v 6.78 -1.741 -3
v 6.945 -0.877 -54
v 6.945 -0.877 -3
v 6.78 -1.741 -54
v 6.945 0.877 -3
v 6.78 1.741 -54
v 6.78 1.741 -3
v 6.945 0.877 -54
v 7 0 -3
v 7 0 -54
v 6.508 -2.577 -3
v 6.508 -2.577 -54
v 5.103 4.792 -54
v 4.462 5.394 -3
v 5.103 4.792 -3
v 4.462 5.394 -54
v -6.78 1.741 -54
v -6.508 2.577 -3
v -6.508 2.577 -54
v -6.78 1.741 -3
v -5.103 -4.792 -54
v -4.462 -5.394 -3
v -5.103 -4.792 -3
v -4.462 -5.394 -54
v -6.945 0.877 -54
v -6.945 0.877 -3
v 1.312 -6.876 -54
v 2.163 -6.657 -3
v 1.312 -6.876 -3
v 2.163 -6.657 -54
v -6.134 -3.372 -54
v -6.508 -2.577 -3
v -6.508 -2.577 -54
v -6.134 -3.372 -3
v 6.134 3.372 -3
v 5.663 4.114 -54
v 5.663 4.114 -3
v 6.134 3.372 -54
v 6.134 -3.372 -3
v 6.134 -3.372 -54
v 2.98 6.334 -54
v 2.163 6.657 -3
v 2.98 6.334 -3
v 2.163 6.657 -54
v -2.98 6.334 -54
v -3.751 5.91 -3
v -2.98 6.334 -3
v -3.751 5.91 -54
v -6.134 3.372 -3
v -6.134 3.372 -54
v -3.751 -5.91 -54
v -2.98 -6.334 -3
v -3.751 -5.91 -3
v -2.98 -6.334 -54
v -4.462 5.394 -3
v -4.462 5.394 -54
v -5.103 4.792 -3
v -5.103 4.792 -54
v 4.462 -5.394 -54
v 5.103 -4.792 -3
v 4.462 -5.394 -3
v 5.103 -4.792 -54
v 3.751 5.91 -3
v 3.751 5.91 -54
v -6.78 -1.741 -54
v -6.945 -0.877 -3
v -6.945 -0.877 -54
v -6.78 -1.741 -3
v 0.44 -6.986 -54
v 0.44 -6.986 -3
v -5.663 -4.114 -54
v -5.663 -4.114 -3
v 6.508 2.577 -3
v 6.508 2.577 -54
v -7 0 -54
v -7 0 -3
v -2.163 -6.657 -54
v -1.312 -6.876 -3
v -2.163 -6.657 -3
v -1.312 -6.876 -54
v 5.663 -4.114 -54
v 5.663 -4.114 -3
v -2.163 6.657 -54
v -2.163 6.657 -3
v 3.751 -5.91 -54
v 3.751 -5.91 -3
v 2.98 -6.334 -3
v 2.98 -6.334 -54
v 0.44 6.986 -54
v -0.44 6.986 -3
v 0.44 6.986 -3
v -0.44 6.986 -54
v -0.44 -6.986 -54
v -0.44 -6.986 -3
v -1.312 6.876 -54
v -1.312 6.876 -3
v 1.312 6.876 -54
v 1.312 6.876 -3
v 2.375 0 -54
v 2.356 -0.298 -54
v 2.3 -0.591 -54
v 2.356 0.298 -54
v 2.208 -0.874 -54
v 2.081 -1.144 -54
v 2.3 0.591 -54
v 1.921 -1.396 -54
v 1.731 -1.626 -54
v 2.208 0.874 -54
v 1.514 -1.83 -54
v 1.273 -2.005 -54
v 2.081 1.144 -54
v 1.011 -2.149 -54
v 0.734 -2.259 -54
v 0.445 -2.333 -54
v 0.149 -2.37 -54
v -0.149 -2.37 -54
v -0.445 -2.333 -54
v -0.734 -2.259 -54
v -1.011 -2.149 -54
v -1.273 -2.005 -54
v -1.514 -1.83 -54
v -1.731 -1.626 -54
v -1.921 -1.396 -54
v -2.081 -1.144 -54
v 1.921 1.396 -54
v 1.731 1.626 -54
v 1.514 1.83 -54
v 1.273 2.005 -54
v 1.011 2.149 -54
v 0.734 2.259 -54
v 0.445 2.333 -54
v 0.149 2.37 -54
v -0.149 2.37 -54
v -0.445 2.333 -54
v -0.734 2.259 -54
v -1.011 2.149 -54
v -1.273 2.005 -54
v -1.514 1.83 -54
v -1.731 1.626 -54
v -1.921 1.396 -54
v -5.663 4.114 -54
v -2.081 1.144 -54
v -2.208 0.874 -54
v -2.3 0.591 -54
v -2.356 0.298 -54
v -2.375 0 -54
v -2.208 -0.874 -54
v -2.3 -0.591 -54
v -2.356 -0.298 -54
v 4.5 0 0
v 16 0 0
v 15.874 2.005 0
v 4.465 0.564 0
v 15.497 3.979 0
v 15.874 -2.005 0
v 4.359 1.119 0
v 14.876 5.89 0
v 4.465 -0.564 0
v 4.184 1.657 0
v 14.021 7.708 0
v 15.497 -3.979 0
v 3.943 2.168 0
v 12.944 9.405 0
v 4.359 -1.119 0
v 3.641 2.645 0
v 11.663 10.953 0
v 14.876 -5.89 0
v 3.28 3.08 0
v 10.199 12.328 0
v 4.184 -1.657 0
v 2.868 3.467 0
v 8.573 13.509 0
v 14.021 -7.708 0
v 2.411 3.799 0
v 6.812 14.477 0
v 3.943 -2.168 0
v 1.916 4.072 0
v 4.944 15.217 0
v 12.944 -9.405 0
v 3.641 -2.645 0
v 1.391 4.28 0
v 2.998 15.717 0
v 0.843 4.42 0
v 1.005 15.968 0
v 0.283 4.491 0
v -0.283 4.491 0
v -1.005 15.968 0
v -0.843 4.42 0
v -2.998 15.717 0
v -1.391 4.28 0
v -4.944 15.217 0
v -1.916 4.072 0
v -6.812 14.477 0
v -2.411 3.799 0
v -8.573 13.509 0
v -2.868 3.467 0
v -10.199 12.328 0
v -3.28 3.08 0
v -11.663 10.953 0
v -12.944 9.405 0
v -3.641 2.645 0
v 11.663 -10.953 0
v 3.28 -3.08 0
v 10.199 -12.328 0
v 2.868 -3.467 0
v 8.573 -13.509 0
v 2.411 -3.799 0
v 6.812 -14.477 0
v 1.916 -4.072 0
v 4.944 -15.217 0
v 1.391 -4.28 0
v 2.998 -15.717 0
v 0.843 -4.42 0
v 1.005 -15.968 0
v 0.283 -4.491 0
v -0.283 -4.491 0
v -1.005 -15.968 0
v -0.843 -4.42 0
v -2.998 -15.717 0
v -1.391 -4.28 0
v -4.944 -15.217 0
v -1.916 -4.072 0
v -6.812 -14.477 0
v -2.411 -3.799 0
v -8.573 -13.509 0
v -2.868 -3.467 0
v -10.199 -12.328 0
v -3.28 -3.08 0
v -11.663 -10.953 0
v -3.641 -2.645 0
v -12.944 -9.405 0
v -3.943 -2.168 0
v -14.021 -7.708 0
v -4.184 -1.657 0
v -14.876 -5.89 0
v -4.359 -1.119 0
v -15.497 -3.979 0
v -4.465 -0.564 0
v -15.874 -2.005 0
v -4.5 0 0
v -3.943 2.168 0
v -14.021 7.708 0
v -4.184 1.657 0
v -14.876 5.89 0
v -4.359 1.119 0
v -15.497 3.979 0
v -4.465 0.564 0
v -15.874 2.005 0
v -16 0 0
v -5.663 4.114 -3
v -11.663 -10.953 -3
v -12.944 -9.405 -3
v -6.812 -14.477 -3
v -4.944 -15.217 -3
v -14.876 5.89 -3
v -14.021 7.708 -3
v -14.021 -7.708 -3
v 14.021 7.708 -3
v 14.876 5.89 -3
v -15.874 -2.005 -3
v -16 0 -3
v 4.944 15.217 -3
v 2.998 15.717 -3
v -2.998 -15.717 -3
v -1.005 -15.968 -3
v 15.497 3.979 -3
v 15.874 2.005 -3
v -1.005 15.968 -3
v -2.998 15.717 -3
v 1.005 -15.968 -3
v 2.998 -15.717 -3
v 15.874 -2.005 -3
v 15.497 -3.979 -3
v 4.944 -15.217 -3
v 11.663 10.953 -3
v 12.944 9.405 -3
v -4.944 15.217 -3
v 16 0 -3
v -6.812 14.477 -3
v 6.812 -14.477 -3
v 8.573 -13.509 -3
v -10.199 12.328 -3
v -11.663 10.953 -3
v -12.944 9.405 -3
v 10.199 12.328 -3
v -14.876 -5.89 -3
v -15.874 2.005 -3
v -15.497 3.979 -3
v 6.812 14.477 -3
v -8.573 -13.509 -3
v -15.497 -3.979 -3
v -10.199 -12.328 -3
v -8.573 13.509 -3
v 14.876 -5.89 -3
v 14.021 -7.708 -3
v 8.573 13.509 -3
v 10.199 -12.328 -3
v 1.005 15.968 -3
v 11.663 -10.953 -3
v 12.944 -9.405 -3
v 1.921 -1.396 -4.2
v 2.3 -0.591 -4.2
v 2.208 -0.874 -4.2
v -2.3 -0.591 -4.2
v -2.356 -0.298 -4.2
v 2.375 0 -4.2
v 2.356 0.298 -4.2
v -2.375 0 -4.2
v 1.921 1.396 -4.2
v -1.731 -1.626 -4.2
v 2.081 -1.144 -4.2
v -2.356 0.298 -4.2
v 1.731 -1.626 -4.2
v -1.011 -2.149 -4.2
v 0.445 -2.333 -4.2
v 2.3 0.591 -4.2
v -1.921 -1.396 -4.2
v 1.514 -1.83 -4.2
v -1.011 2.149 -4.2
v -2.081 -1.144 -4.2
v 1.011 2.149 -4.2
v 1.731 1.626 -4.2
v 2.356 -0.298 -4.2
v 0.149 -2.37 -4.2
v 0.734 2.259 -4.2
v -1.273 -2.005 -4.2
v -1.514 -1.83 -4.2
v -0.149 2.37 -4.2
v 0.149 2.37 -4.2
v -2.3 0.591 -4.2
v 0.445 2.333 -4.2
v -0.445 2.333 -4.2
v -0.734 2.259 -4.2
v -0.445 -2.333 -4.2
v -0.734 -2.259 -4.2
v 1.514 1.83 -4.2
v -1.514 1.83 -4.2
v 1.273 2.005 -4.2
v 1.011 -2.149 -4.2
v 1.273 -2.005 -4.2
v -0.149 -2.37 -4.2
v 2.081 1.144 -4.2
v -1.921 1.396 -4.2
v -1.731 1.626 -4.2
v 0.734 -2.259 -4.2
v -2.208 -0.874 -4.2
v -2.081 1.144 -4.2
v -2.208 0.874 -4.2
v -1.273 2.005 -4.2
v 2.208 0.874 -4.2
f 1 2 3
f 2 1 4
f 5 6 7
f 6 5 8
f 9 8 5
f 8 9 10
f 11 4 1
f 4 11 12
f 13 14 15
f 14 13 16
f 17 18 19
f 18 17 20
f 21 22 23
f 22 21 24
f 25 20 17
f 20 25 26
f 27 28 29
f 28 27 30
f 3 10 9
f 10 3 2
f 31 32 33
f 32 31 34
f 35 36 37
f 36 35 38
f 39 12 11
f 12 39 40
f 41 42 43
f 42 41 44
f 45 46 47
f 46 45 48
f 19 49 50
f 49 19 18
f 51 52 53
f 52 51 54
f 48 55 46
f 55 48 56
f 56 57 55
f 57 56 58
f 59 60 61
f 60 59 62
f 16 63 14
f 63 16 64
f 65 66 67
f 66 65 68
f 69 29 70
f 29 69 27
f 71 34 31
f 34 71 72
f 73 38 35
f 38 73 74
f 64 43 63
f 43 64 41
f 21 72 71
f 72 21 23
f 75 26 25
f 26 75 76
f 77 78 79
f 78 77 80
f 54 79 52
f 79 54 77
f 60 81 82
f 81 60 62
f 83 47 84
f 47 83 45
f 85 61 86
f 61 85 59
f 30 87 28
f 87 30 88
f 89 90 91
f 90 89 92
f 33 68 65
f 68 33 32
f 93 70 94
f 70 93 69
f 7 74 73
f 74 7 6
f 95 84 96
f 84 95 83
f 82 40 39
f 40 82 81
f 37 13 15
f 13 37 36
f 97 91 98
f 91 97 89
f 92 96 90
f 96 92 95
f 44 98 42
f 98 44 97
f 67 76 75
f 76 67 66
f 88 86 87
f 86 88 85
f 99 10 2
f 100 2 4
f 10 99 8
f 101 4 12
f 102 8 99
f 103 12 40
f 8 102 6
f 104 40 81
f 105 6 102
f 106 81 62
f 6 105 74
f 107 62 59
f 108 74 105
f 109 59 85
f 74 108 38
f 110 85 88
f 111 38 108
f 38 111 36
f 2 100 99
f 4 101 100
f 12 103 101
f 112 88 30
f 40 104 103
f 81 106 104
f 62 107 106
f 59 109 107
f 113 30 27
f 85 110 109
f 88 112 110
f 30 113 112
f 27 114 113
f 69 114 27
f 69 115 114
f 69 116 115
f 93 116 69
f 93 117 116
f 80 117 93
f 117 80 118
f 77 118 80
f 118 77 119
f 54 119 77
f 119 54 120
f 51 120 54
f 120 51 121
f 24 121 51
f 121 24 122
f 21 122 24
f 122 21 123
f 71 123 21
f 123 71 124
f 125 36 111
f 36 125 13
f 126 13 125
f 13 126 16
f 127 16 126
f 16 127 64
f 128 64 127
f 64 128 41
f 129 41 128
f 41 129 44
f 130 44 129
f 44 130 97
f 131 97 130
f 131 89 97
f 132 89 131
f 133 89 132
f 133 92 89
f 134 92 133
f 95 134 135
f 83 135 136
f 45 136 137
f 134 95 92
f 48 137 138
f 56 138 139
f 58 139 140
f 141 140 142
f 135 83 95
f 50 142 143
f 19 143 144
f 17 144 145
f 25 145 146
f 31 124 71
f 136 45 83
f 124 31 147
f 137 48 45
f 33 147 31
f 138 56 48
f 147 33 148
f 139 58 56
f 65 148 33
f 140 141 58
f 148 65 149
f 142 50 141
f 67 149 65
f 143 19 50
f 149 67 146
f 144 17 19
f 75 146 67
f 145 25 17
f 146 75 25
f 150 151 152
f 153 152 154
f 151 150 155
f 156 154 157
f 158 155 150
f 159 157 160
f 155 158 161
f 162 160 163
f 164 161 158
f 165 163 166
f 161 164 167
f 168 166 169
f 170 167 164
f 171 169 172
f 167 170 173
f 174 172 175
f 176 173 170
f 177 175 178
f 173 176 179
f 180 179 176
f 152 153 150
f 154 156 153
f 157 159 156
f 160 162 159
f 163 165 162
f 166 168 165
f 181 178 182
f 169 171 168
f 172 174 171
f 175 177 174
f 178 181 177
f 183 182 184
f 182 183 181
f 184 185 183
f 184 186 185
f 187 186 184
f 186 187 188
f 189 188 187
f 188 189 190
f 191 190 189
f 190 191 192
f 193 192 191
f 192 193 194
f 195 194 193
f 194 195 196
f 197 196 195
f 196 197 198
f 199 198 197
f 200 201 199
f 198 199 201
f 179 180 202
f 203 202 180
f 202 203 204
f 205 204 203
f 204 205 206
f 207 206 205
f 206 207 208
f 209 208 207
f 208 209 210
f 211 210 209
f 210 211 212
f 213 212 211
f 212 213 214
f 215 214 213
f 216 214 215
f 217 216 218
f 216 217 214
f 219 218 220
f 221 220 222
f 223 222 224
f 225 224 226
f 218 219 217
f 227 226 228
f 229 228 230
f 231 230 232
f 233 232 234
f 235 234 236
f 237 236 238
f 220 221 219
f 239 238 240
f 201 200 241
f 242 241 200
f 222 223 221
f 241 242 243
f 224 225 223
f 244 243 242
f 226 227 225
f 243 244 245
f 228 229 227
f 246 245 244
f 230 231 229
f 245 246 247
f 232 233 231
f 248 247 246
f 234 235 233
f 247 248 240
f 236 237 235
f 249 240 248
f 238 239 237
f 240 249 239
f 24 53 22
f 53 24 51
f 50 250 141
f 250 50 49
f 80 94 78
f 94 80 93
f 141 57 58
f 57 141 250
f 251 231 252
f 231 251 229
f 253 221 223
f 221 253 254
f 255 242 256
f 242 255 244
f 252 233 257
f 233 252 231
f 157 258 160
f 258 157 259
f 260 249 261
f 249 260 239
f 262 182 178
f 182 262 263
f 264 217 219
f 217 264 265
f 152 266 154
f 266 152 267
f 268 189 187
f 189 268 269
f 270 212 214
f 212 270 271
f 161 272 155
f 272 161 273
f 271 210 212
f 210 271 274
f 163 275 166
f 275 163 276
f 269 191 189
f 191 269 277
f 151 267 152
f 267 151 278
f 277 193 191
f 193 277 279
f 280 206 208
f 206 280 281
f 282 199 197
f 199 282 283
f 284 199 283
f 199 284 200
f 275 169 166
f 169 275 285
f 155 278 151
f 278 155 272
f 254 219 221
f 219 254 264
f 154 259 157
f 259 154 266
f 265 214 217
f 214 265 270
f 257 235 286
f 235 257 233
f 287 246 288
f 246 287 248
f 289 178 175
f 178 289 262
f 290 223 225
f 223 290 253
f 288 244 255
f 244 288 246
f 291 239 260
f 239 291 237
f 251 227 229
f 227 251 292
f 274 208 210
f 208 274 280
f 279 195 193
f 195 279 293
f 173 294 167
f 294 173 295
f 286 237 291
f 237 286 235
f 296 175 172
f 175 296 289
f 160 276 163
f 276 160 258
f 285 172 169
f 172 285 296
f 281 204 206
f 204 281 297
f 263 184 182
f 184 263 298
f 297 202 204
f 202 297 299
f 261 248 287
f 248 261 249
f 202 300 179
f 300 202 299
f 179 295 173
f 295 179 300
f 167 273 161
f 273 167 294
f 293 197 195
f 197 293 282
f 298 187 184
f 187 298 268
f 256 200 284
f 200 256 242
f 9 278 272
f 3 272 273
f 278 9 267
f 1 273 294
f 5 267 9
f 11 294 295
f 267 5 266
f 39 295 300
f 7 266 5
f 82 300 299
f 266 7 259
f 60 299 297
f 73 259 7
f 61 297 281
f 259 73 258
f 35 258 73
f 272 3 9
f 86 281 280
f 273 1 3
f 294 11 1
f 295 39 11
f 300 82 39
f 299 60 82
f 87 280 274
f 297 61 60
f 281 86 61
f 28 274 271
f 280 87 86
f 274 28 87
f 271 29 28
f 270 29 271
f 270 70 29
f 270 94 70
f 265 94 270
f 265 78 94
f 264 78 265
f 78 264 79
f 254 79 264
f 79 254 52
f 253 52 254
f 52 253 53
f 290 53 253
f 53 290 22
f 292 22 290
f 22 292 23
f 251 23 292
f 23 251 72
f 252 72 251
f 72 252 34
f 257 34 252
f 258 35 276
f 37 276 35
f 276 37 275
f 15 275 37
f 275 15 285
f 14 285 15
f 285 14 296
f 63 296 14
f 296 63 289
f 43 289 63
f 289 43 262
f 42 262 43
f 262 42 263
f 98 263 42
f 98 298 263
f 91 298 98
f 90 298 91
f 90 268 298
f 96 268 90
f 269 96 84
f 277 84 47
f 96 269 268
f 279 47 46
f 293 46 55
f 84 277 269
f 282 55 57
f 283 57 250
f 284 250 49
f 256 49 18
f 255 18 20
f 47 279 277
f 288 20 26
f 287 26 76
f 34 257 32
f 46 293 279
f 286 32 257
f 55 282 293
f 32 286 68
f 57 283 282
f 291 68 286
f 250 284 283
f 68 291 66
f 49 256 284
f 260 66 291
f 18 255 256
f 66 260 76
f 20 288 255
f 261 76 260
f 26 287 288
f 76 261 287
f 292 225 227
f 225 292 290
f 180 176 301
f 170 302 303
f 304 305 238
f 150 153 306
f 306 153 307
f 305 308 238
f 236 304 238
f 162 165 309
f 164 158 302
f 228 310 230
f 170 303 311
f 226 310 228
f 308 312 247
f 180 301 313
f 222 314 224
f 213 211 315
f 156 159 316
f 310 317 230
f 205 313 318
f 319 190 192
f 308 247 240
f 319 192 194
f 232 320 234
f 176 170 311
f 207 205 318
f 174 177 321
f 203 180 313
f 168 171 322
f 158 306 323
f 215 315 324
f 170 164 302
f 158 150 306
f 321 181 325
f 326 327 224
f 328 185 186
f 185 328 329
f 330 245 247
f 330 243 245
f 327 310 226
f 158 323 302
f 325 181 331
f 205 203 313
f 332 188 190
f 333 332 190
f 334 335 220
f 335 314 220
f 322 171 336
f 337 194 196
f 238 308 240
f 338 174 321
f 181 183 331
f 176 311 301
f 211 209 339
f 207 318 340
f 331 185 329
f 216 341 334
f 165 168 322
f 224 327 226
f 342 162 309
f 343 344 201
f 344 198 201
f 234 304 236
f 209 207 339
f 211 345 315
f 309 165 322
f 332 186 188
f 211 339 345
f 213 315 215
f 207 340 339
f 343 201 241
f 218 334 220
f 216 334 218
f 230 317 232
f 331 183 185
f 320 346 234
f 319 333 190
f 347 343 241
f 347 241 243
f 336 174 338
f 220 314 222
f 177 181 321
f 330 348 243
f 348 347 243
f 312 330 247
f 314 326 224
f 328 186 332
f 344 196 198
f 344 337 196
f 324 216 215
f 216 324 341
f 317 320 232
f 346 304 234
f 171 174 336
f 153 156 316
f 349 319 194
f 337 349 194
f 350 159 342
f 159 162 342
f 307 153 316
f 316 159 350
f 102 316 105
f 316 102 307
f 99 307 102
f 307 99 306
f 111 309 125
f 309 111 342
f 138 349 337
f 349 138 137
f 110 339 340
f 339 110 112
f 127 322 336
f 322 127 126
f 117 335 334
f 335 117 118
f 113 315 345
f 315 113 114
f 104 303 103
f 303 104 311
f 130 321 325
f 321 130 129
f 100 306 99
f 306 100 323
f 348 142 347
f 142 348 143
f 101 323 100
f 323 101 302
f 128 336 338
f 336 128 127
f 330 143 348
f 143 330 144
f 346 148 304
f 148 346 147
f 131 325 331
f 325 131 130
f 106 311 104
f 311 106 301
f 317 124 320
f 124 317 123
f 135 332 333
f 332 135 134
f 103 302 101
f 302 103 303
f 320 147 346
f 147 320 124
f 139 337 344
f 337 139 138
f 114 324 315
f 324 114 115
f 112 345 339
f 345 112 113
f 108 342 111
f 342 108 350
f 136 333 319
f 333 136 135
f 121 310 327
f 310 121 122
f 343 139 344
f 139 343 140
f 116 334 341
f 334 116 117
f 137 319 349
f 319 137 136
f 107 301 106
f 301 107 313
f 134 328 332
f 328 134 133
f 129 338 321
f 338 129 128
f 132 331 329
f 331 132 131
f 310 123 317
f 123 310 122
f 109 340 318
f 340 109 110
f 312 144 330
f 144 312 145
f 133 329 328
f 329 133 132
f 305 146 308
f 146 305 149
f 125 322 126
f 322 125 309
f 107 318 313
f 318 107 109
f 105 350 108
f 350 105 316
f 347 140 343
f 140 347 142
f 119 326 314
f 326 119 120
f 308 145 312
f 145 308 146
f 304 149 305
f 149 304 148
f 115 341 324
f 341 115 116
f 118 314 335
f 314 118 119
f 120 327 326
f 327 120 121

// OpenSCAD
$fn = 50;


difference() {
	union() {
		translate(v = [0, 0, -54.0000000000]) {
			cylinder(h = 54, r = 7.0000000000);
		}
		translate(v = [0, 0, -3.0000000000]) {
			cylinder(h = 3, r = 16.0000000000);
		}
	}
	union() {
		translate(v = [0, 0, 0]) {
			rotate(a = [0, 0, 0]) {
				difference() {
					union() {
						#translate(v = [0, 0, -54.0000000000]) {
							cylinder(h = 54, r = 2.2500000000);
						}
						#translate(v = [0, 0, -4.2000000000]) {
							cylinder(h = 4.2000000000, r = 7.0000000000, r1 = 2.3750000000, r2 = 4.5000000000);
						}
						#translate(v = [0, 0, -54.0000000000]) {
							cylinder(h = 54, r = 2.3750000000);
						}
						#translate(v = [0, 0, -54.0000000000]) {
							cylinder(h = 54, r = 2.2500000000);
						}
					}
					union();
				}
			}
		}
	}
}
